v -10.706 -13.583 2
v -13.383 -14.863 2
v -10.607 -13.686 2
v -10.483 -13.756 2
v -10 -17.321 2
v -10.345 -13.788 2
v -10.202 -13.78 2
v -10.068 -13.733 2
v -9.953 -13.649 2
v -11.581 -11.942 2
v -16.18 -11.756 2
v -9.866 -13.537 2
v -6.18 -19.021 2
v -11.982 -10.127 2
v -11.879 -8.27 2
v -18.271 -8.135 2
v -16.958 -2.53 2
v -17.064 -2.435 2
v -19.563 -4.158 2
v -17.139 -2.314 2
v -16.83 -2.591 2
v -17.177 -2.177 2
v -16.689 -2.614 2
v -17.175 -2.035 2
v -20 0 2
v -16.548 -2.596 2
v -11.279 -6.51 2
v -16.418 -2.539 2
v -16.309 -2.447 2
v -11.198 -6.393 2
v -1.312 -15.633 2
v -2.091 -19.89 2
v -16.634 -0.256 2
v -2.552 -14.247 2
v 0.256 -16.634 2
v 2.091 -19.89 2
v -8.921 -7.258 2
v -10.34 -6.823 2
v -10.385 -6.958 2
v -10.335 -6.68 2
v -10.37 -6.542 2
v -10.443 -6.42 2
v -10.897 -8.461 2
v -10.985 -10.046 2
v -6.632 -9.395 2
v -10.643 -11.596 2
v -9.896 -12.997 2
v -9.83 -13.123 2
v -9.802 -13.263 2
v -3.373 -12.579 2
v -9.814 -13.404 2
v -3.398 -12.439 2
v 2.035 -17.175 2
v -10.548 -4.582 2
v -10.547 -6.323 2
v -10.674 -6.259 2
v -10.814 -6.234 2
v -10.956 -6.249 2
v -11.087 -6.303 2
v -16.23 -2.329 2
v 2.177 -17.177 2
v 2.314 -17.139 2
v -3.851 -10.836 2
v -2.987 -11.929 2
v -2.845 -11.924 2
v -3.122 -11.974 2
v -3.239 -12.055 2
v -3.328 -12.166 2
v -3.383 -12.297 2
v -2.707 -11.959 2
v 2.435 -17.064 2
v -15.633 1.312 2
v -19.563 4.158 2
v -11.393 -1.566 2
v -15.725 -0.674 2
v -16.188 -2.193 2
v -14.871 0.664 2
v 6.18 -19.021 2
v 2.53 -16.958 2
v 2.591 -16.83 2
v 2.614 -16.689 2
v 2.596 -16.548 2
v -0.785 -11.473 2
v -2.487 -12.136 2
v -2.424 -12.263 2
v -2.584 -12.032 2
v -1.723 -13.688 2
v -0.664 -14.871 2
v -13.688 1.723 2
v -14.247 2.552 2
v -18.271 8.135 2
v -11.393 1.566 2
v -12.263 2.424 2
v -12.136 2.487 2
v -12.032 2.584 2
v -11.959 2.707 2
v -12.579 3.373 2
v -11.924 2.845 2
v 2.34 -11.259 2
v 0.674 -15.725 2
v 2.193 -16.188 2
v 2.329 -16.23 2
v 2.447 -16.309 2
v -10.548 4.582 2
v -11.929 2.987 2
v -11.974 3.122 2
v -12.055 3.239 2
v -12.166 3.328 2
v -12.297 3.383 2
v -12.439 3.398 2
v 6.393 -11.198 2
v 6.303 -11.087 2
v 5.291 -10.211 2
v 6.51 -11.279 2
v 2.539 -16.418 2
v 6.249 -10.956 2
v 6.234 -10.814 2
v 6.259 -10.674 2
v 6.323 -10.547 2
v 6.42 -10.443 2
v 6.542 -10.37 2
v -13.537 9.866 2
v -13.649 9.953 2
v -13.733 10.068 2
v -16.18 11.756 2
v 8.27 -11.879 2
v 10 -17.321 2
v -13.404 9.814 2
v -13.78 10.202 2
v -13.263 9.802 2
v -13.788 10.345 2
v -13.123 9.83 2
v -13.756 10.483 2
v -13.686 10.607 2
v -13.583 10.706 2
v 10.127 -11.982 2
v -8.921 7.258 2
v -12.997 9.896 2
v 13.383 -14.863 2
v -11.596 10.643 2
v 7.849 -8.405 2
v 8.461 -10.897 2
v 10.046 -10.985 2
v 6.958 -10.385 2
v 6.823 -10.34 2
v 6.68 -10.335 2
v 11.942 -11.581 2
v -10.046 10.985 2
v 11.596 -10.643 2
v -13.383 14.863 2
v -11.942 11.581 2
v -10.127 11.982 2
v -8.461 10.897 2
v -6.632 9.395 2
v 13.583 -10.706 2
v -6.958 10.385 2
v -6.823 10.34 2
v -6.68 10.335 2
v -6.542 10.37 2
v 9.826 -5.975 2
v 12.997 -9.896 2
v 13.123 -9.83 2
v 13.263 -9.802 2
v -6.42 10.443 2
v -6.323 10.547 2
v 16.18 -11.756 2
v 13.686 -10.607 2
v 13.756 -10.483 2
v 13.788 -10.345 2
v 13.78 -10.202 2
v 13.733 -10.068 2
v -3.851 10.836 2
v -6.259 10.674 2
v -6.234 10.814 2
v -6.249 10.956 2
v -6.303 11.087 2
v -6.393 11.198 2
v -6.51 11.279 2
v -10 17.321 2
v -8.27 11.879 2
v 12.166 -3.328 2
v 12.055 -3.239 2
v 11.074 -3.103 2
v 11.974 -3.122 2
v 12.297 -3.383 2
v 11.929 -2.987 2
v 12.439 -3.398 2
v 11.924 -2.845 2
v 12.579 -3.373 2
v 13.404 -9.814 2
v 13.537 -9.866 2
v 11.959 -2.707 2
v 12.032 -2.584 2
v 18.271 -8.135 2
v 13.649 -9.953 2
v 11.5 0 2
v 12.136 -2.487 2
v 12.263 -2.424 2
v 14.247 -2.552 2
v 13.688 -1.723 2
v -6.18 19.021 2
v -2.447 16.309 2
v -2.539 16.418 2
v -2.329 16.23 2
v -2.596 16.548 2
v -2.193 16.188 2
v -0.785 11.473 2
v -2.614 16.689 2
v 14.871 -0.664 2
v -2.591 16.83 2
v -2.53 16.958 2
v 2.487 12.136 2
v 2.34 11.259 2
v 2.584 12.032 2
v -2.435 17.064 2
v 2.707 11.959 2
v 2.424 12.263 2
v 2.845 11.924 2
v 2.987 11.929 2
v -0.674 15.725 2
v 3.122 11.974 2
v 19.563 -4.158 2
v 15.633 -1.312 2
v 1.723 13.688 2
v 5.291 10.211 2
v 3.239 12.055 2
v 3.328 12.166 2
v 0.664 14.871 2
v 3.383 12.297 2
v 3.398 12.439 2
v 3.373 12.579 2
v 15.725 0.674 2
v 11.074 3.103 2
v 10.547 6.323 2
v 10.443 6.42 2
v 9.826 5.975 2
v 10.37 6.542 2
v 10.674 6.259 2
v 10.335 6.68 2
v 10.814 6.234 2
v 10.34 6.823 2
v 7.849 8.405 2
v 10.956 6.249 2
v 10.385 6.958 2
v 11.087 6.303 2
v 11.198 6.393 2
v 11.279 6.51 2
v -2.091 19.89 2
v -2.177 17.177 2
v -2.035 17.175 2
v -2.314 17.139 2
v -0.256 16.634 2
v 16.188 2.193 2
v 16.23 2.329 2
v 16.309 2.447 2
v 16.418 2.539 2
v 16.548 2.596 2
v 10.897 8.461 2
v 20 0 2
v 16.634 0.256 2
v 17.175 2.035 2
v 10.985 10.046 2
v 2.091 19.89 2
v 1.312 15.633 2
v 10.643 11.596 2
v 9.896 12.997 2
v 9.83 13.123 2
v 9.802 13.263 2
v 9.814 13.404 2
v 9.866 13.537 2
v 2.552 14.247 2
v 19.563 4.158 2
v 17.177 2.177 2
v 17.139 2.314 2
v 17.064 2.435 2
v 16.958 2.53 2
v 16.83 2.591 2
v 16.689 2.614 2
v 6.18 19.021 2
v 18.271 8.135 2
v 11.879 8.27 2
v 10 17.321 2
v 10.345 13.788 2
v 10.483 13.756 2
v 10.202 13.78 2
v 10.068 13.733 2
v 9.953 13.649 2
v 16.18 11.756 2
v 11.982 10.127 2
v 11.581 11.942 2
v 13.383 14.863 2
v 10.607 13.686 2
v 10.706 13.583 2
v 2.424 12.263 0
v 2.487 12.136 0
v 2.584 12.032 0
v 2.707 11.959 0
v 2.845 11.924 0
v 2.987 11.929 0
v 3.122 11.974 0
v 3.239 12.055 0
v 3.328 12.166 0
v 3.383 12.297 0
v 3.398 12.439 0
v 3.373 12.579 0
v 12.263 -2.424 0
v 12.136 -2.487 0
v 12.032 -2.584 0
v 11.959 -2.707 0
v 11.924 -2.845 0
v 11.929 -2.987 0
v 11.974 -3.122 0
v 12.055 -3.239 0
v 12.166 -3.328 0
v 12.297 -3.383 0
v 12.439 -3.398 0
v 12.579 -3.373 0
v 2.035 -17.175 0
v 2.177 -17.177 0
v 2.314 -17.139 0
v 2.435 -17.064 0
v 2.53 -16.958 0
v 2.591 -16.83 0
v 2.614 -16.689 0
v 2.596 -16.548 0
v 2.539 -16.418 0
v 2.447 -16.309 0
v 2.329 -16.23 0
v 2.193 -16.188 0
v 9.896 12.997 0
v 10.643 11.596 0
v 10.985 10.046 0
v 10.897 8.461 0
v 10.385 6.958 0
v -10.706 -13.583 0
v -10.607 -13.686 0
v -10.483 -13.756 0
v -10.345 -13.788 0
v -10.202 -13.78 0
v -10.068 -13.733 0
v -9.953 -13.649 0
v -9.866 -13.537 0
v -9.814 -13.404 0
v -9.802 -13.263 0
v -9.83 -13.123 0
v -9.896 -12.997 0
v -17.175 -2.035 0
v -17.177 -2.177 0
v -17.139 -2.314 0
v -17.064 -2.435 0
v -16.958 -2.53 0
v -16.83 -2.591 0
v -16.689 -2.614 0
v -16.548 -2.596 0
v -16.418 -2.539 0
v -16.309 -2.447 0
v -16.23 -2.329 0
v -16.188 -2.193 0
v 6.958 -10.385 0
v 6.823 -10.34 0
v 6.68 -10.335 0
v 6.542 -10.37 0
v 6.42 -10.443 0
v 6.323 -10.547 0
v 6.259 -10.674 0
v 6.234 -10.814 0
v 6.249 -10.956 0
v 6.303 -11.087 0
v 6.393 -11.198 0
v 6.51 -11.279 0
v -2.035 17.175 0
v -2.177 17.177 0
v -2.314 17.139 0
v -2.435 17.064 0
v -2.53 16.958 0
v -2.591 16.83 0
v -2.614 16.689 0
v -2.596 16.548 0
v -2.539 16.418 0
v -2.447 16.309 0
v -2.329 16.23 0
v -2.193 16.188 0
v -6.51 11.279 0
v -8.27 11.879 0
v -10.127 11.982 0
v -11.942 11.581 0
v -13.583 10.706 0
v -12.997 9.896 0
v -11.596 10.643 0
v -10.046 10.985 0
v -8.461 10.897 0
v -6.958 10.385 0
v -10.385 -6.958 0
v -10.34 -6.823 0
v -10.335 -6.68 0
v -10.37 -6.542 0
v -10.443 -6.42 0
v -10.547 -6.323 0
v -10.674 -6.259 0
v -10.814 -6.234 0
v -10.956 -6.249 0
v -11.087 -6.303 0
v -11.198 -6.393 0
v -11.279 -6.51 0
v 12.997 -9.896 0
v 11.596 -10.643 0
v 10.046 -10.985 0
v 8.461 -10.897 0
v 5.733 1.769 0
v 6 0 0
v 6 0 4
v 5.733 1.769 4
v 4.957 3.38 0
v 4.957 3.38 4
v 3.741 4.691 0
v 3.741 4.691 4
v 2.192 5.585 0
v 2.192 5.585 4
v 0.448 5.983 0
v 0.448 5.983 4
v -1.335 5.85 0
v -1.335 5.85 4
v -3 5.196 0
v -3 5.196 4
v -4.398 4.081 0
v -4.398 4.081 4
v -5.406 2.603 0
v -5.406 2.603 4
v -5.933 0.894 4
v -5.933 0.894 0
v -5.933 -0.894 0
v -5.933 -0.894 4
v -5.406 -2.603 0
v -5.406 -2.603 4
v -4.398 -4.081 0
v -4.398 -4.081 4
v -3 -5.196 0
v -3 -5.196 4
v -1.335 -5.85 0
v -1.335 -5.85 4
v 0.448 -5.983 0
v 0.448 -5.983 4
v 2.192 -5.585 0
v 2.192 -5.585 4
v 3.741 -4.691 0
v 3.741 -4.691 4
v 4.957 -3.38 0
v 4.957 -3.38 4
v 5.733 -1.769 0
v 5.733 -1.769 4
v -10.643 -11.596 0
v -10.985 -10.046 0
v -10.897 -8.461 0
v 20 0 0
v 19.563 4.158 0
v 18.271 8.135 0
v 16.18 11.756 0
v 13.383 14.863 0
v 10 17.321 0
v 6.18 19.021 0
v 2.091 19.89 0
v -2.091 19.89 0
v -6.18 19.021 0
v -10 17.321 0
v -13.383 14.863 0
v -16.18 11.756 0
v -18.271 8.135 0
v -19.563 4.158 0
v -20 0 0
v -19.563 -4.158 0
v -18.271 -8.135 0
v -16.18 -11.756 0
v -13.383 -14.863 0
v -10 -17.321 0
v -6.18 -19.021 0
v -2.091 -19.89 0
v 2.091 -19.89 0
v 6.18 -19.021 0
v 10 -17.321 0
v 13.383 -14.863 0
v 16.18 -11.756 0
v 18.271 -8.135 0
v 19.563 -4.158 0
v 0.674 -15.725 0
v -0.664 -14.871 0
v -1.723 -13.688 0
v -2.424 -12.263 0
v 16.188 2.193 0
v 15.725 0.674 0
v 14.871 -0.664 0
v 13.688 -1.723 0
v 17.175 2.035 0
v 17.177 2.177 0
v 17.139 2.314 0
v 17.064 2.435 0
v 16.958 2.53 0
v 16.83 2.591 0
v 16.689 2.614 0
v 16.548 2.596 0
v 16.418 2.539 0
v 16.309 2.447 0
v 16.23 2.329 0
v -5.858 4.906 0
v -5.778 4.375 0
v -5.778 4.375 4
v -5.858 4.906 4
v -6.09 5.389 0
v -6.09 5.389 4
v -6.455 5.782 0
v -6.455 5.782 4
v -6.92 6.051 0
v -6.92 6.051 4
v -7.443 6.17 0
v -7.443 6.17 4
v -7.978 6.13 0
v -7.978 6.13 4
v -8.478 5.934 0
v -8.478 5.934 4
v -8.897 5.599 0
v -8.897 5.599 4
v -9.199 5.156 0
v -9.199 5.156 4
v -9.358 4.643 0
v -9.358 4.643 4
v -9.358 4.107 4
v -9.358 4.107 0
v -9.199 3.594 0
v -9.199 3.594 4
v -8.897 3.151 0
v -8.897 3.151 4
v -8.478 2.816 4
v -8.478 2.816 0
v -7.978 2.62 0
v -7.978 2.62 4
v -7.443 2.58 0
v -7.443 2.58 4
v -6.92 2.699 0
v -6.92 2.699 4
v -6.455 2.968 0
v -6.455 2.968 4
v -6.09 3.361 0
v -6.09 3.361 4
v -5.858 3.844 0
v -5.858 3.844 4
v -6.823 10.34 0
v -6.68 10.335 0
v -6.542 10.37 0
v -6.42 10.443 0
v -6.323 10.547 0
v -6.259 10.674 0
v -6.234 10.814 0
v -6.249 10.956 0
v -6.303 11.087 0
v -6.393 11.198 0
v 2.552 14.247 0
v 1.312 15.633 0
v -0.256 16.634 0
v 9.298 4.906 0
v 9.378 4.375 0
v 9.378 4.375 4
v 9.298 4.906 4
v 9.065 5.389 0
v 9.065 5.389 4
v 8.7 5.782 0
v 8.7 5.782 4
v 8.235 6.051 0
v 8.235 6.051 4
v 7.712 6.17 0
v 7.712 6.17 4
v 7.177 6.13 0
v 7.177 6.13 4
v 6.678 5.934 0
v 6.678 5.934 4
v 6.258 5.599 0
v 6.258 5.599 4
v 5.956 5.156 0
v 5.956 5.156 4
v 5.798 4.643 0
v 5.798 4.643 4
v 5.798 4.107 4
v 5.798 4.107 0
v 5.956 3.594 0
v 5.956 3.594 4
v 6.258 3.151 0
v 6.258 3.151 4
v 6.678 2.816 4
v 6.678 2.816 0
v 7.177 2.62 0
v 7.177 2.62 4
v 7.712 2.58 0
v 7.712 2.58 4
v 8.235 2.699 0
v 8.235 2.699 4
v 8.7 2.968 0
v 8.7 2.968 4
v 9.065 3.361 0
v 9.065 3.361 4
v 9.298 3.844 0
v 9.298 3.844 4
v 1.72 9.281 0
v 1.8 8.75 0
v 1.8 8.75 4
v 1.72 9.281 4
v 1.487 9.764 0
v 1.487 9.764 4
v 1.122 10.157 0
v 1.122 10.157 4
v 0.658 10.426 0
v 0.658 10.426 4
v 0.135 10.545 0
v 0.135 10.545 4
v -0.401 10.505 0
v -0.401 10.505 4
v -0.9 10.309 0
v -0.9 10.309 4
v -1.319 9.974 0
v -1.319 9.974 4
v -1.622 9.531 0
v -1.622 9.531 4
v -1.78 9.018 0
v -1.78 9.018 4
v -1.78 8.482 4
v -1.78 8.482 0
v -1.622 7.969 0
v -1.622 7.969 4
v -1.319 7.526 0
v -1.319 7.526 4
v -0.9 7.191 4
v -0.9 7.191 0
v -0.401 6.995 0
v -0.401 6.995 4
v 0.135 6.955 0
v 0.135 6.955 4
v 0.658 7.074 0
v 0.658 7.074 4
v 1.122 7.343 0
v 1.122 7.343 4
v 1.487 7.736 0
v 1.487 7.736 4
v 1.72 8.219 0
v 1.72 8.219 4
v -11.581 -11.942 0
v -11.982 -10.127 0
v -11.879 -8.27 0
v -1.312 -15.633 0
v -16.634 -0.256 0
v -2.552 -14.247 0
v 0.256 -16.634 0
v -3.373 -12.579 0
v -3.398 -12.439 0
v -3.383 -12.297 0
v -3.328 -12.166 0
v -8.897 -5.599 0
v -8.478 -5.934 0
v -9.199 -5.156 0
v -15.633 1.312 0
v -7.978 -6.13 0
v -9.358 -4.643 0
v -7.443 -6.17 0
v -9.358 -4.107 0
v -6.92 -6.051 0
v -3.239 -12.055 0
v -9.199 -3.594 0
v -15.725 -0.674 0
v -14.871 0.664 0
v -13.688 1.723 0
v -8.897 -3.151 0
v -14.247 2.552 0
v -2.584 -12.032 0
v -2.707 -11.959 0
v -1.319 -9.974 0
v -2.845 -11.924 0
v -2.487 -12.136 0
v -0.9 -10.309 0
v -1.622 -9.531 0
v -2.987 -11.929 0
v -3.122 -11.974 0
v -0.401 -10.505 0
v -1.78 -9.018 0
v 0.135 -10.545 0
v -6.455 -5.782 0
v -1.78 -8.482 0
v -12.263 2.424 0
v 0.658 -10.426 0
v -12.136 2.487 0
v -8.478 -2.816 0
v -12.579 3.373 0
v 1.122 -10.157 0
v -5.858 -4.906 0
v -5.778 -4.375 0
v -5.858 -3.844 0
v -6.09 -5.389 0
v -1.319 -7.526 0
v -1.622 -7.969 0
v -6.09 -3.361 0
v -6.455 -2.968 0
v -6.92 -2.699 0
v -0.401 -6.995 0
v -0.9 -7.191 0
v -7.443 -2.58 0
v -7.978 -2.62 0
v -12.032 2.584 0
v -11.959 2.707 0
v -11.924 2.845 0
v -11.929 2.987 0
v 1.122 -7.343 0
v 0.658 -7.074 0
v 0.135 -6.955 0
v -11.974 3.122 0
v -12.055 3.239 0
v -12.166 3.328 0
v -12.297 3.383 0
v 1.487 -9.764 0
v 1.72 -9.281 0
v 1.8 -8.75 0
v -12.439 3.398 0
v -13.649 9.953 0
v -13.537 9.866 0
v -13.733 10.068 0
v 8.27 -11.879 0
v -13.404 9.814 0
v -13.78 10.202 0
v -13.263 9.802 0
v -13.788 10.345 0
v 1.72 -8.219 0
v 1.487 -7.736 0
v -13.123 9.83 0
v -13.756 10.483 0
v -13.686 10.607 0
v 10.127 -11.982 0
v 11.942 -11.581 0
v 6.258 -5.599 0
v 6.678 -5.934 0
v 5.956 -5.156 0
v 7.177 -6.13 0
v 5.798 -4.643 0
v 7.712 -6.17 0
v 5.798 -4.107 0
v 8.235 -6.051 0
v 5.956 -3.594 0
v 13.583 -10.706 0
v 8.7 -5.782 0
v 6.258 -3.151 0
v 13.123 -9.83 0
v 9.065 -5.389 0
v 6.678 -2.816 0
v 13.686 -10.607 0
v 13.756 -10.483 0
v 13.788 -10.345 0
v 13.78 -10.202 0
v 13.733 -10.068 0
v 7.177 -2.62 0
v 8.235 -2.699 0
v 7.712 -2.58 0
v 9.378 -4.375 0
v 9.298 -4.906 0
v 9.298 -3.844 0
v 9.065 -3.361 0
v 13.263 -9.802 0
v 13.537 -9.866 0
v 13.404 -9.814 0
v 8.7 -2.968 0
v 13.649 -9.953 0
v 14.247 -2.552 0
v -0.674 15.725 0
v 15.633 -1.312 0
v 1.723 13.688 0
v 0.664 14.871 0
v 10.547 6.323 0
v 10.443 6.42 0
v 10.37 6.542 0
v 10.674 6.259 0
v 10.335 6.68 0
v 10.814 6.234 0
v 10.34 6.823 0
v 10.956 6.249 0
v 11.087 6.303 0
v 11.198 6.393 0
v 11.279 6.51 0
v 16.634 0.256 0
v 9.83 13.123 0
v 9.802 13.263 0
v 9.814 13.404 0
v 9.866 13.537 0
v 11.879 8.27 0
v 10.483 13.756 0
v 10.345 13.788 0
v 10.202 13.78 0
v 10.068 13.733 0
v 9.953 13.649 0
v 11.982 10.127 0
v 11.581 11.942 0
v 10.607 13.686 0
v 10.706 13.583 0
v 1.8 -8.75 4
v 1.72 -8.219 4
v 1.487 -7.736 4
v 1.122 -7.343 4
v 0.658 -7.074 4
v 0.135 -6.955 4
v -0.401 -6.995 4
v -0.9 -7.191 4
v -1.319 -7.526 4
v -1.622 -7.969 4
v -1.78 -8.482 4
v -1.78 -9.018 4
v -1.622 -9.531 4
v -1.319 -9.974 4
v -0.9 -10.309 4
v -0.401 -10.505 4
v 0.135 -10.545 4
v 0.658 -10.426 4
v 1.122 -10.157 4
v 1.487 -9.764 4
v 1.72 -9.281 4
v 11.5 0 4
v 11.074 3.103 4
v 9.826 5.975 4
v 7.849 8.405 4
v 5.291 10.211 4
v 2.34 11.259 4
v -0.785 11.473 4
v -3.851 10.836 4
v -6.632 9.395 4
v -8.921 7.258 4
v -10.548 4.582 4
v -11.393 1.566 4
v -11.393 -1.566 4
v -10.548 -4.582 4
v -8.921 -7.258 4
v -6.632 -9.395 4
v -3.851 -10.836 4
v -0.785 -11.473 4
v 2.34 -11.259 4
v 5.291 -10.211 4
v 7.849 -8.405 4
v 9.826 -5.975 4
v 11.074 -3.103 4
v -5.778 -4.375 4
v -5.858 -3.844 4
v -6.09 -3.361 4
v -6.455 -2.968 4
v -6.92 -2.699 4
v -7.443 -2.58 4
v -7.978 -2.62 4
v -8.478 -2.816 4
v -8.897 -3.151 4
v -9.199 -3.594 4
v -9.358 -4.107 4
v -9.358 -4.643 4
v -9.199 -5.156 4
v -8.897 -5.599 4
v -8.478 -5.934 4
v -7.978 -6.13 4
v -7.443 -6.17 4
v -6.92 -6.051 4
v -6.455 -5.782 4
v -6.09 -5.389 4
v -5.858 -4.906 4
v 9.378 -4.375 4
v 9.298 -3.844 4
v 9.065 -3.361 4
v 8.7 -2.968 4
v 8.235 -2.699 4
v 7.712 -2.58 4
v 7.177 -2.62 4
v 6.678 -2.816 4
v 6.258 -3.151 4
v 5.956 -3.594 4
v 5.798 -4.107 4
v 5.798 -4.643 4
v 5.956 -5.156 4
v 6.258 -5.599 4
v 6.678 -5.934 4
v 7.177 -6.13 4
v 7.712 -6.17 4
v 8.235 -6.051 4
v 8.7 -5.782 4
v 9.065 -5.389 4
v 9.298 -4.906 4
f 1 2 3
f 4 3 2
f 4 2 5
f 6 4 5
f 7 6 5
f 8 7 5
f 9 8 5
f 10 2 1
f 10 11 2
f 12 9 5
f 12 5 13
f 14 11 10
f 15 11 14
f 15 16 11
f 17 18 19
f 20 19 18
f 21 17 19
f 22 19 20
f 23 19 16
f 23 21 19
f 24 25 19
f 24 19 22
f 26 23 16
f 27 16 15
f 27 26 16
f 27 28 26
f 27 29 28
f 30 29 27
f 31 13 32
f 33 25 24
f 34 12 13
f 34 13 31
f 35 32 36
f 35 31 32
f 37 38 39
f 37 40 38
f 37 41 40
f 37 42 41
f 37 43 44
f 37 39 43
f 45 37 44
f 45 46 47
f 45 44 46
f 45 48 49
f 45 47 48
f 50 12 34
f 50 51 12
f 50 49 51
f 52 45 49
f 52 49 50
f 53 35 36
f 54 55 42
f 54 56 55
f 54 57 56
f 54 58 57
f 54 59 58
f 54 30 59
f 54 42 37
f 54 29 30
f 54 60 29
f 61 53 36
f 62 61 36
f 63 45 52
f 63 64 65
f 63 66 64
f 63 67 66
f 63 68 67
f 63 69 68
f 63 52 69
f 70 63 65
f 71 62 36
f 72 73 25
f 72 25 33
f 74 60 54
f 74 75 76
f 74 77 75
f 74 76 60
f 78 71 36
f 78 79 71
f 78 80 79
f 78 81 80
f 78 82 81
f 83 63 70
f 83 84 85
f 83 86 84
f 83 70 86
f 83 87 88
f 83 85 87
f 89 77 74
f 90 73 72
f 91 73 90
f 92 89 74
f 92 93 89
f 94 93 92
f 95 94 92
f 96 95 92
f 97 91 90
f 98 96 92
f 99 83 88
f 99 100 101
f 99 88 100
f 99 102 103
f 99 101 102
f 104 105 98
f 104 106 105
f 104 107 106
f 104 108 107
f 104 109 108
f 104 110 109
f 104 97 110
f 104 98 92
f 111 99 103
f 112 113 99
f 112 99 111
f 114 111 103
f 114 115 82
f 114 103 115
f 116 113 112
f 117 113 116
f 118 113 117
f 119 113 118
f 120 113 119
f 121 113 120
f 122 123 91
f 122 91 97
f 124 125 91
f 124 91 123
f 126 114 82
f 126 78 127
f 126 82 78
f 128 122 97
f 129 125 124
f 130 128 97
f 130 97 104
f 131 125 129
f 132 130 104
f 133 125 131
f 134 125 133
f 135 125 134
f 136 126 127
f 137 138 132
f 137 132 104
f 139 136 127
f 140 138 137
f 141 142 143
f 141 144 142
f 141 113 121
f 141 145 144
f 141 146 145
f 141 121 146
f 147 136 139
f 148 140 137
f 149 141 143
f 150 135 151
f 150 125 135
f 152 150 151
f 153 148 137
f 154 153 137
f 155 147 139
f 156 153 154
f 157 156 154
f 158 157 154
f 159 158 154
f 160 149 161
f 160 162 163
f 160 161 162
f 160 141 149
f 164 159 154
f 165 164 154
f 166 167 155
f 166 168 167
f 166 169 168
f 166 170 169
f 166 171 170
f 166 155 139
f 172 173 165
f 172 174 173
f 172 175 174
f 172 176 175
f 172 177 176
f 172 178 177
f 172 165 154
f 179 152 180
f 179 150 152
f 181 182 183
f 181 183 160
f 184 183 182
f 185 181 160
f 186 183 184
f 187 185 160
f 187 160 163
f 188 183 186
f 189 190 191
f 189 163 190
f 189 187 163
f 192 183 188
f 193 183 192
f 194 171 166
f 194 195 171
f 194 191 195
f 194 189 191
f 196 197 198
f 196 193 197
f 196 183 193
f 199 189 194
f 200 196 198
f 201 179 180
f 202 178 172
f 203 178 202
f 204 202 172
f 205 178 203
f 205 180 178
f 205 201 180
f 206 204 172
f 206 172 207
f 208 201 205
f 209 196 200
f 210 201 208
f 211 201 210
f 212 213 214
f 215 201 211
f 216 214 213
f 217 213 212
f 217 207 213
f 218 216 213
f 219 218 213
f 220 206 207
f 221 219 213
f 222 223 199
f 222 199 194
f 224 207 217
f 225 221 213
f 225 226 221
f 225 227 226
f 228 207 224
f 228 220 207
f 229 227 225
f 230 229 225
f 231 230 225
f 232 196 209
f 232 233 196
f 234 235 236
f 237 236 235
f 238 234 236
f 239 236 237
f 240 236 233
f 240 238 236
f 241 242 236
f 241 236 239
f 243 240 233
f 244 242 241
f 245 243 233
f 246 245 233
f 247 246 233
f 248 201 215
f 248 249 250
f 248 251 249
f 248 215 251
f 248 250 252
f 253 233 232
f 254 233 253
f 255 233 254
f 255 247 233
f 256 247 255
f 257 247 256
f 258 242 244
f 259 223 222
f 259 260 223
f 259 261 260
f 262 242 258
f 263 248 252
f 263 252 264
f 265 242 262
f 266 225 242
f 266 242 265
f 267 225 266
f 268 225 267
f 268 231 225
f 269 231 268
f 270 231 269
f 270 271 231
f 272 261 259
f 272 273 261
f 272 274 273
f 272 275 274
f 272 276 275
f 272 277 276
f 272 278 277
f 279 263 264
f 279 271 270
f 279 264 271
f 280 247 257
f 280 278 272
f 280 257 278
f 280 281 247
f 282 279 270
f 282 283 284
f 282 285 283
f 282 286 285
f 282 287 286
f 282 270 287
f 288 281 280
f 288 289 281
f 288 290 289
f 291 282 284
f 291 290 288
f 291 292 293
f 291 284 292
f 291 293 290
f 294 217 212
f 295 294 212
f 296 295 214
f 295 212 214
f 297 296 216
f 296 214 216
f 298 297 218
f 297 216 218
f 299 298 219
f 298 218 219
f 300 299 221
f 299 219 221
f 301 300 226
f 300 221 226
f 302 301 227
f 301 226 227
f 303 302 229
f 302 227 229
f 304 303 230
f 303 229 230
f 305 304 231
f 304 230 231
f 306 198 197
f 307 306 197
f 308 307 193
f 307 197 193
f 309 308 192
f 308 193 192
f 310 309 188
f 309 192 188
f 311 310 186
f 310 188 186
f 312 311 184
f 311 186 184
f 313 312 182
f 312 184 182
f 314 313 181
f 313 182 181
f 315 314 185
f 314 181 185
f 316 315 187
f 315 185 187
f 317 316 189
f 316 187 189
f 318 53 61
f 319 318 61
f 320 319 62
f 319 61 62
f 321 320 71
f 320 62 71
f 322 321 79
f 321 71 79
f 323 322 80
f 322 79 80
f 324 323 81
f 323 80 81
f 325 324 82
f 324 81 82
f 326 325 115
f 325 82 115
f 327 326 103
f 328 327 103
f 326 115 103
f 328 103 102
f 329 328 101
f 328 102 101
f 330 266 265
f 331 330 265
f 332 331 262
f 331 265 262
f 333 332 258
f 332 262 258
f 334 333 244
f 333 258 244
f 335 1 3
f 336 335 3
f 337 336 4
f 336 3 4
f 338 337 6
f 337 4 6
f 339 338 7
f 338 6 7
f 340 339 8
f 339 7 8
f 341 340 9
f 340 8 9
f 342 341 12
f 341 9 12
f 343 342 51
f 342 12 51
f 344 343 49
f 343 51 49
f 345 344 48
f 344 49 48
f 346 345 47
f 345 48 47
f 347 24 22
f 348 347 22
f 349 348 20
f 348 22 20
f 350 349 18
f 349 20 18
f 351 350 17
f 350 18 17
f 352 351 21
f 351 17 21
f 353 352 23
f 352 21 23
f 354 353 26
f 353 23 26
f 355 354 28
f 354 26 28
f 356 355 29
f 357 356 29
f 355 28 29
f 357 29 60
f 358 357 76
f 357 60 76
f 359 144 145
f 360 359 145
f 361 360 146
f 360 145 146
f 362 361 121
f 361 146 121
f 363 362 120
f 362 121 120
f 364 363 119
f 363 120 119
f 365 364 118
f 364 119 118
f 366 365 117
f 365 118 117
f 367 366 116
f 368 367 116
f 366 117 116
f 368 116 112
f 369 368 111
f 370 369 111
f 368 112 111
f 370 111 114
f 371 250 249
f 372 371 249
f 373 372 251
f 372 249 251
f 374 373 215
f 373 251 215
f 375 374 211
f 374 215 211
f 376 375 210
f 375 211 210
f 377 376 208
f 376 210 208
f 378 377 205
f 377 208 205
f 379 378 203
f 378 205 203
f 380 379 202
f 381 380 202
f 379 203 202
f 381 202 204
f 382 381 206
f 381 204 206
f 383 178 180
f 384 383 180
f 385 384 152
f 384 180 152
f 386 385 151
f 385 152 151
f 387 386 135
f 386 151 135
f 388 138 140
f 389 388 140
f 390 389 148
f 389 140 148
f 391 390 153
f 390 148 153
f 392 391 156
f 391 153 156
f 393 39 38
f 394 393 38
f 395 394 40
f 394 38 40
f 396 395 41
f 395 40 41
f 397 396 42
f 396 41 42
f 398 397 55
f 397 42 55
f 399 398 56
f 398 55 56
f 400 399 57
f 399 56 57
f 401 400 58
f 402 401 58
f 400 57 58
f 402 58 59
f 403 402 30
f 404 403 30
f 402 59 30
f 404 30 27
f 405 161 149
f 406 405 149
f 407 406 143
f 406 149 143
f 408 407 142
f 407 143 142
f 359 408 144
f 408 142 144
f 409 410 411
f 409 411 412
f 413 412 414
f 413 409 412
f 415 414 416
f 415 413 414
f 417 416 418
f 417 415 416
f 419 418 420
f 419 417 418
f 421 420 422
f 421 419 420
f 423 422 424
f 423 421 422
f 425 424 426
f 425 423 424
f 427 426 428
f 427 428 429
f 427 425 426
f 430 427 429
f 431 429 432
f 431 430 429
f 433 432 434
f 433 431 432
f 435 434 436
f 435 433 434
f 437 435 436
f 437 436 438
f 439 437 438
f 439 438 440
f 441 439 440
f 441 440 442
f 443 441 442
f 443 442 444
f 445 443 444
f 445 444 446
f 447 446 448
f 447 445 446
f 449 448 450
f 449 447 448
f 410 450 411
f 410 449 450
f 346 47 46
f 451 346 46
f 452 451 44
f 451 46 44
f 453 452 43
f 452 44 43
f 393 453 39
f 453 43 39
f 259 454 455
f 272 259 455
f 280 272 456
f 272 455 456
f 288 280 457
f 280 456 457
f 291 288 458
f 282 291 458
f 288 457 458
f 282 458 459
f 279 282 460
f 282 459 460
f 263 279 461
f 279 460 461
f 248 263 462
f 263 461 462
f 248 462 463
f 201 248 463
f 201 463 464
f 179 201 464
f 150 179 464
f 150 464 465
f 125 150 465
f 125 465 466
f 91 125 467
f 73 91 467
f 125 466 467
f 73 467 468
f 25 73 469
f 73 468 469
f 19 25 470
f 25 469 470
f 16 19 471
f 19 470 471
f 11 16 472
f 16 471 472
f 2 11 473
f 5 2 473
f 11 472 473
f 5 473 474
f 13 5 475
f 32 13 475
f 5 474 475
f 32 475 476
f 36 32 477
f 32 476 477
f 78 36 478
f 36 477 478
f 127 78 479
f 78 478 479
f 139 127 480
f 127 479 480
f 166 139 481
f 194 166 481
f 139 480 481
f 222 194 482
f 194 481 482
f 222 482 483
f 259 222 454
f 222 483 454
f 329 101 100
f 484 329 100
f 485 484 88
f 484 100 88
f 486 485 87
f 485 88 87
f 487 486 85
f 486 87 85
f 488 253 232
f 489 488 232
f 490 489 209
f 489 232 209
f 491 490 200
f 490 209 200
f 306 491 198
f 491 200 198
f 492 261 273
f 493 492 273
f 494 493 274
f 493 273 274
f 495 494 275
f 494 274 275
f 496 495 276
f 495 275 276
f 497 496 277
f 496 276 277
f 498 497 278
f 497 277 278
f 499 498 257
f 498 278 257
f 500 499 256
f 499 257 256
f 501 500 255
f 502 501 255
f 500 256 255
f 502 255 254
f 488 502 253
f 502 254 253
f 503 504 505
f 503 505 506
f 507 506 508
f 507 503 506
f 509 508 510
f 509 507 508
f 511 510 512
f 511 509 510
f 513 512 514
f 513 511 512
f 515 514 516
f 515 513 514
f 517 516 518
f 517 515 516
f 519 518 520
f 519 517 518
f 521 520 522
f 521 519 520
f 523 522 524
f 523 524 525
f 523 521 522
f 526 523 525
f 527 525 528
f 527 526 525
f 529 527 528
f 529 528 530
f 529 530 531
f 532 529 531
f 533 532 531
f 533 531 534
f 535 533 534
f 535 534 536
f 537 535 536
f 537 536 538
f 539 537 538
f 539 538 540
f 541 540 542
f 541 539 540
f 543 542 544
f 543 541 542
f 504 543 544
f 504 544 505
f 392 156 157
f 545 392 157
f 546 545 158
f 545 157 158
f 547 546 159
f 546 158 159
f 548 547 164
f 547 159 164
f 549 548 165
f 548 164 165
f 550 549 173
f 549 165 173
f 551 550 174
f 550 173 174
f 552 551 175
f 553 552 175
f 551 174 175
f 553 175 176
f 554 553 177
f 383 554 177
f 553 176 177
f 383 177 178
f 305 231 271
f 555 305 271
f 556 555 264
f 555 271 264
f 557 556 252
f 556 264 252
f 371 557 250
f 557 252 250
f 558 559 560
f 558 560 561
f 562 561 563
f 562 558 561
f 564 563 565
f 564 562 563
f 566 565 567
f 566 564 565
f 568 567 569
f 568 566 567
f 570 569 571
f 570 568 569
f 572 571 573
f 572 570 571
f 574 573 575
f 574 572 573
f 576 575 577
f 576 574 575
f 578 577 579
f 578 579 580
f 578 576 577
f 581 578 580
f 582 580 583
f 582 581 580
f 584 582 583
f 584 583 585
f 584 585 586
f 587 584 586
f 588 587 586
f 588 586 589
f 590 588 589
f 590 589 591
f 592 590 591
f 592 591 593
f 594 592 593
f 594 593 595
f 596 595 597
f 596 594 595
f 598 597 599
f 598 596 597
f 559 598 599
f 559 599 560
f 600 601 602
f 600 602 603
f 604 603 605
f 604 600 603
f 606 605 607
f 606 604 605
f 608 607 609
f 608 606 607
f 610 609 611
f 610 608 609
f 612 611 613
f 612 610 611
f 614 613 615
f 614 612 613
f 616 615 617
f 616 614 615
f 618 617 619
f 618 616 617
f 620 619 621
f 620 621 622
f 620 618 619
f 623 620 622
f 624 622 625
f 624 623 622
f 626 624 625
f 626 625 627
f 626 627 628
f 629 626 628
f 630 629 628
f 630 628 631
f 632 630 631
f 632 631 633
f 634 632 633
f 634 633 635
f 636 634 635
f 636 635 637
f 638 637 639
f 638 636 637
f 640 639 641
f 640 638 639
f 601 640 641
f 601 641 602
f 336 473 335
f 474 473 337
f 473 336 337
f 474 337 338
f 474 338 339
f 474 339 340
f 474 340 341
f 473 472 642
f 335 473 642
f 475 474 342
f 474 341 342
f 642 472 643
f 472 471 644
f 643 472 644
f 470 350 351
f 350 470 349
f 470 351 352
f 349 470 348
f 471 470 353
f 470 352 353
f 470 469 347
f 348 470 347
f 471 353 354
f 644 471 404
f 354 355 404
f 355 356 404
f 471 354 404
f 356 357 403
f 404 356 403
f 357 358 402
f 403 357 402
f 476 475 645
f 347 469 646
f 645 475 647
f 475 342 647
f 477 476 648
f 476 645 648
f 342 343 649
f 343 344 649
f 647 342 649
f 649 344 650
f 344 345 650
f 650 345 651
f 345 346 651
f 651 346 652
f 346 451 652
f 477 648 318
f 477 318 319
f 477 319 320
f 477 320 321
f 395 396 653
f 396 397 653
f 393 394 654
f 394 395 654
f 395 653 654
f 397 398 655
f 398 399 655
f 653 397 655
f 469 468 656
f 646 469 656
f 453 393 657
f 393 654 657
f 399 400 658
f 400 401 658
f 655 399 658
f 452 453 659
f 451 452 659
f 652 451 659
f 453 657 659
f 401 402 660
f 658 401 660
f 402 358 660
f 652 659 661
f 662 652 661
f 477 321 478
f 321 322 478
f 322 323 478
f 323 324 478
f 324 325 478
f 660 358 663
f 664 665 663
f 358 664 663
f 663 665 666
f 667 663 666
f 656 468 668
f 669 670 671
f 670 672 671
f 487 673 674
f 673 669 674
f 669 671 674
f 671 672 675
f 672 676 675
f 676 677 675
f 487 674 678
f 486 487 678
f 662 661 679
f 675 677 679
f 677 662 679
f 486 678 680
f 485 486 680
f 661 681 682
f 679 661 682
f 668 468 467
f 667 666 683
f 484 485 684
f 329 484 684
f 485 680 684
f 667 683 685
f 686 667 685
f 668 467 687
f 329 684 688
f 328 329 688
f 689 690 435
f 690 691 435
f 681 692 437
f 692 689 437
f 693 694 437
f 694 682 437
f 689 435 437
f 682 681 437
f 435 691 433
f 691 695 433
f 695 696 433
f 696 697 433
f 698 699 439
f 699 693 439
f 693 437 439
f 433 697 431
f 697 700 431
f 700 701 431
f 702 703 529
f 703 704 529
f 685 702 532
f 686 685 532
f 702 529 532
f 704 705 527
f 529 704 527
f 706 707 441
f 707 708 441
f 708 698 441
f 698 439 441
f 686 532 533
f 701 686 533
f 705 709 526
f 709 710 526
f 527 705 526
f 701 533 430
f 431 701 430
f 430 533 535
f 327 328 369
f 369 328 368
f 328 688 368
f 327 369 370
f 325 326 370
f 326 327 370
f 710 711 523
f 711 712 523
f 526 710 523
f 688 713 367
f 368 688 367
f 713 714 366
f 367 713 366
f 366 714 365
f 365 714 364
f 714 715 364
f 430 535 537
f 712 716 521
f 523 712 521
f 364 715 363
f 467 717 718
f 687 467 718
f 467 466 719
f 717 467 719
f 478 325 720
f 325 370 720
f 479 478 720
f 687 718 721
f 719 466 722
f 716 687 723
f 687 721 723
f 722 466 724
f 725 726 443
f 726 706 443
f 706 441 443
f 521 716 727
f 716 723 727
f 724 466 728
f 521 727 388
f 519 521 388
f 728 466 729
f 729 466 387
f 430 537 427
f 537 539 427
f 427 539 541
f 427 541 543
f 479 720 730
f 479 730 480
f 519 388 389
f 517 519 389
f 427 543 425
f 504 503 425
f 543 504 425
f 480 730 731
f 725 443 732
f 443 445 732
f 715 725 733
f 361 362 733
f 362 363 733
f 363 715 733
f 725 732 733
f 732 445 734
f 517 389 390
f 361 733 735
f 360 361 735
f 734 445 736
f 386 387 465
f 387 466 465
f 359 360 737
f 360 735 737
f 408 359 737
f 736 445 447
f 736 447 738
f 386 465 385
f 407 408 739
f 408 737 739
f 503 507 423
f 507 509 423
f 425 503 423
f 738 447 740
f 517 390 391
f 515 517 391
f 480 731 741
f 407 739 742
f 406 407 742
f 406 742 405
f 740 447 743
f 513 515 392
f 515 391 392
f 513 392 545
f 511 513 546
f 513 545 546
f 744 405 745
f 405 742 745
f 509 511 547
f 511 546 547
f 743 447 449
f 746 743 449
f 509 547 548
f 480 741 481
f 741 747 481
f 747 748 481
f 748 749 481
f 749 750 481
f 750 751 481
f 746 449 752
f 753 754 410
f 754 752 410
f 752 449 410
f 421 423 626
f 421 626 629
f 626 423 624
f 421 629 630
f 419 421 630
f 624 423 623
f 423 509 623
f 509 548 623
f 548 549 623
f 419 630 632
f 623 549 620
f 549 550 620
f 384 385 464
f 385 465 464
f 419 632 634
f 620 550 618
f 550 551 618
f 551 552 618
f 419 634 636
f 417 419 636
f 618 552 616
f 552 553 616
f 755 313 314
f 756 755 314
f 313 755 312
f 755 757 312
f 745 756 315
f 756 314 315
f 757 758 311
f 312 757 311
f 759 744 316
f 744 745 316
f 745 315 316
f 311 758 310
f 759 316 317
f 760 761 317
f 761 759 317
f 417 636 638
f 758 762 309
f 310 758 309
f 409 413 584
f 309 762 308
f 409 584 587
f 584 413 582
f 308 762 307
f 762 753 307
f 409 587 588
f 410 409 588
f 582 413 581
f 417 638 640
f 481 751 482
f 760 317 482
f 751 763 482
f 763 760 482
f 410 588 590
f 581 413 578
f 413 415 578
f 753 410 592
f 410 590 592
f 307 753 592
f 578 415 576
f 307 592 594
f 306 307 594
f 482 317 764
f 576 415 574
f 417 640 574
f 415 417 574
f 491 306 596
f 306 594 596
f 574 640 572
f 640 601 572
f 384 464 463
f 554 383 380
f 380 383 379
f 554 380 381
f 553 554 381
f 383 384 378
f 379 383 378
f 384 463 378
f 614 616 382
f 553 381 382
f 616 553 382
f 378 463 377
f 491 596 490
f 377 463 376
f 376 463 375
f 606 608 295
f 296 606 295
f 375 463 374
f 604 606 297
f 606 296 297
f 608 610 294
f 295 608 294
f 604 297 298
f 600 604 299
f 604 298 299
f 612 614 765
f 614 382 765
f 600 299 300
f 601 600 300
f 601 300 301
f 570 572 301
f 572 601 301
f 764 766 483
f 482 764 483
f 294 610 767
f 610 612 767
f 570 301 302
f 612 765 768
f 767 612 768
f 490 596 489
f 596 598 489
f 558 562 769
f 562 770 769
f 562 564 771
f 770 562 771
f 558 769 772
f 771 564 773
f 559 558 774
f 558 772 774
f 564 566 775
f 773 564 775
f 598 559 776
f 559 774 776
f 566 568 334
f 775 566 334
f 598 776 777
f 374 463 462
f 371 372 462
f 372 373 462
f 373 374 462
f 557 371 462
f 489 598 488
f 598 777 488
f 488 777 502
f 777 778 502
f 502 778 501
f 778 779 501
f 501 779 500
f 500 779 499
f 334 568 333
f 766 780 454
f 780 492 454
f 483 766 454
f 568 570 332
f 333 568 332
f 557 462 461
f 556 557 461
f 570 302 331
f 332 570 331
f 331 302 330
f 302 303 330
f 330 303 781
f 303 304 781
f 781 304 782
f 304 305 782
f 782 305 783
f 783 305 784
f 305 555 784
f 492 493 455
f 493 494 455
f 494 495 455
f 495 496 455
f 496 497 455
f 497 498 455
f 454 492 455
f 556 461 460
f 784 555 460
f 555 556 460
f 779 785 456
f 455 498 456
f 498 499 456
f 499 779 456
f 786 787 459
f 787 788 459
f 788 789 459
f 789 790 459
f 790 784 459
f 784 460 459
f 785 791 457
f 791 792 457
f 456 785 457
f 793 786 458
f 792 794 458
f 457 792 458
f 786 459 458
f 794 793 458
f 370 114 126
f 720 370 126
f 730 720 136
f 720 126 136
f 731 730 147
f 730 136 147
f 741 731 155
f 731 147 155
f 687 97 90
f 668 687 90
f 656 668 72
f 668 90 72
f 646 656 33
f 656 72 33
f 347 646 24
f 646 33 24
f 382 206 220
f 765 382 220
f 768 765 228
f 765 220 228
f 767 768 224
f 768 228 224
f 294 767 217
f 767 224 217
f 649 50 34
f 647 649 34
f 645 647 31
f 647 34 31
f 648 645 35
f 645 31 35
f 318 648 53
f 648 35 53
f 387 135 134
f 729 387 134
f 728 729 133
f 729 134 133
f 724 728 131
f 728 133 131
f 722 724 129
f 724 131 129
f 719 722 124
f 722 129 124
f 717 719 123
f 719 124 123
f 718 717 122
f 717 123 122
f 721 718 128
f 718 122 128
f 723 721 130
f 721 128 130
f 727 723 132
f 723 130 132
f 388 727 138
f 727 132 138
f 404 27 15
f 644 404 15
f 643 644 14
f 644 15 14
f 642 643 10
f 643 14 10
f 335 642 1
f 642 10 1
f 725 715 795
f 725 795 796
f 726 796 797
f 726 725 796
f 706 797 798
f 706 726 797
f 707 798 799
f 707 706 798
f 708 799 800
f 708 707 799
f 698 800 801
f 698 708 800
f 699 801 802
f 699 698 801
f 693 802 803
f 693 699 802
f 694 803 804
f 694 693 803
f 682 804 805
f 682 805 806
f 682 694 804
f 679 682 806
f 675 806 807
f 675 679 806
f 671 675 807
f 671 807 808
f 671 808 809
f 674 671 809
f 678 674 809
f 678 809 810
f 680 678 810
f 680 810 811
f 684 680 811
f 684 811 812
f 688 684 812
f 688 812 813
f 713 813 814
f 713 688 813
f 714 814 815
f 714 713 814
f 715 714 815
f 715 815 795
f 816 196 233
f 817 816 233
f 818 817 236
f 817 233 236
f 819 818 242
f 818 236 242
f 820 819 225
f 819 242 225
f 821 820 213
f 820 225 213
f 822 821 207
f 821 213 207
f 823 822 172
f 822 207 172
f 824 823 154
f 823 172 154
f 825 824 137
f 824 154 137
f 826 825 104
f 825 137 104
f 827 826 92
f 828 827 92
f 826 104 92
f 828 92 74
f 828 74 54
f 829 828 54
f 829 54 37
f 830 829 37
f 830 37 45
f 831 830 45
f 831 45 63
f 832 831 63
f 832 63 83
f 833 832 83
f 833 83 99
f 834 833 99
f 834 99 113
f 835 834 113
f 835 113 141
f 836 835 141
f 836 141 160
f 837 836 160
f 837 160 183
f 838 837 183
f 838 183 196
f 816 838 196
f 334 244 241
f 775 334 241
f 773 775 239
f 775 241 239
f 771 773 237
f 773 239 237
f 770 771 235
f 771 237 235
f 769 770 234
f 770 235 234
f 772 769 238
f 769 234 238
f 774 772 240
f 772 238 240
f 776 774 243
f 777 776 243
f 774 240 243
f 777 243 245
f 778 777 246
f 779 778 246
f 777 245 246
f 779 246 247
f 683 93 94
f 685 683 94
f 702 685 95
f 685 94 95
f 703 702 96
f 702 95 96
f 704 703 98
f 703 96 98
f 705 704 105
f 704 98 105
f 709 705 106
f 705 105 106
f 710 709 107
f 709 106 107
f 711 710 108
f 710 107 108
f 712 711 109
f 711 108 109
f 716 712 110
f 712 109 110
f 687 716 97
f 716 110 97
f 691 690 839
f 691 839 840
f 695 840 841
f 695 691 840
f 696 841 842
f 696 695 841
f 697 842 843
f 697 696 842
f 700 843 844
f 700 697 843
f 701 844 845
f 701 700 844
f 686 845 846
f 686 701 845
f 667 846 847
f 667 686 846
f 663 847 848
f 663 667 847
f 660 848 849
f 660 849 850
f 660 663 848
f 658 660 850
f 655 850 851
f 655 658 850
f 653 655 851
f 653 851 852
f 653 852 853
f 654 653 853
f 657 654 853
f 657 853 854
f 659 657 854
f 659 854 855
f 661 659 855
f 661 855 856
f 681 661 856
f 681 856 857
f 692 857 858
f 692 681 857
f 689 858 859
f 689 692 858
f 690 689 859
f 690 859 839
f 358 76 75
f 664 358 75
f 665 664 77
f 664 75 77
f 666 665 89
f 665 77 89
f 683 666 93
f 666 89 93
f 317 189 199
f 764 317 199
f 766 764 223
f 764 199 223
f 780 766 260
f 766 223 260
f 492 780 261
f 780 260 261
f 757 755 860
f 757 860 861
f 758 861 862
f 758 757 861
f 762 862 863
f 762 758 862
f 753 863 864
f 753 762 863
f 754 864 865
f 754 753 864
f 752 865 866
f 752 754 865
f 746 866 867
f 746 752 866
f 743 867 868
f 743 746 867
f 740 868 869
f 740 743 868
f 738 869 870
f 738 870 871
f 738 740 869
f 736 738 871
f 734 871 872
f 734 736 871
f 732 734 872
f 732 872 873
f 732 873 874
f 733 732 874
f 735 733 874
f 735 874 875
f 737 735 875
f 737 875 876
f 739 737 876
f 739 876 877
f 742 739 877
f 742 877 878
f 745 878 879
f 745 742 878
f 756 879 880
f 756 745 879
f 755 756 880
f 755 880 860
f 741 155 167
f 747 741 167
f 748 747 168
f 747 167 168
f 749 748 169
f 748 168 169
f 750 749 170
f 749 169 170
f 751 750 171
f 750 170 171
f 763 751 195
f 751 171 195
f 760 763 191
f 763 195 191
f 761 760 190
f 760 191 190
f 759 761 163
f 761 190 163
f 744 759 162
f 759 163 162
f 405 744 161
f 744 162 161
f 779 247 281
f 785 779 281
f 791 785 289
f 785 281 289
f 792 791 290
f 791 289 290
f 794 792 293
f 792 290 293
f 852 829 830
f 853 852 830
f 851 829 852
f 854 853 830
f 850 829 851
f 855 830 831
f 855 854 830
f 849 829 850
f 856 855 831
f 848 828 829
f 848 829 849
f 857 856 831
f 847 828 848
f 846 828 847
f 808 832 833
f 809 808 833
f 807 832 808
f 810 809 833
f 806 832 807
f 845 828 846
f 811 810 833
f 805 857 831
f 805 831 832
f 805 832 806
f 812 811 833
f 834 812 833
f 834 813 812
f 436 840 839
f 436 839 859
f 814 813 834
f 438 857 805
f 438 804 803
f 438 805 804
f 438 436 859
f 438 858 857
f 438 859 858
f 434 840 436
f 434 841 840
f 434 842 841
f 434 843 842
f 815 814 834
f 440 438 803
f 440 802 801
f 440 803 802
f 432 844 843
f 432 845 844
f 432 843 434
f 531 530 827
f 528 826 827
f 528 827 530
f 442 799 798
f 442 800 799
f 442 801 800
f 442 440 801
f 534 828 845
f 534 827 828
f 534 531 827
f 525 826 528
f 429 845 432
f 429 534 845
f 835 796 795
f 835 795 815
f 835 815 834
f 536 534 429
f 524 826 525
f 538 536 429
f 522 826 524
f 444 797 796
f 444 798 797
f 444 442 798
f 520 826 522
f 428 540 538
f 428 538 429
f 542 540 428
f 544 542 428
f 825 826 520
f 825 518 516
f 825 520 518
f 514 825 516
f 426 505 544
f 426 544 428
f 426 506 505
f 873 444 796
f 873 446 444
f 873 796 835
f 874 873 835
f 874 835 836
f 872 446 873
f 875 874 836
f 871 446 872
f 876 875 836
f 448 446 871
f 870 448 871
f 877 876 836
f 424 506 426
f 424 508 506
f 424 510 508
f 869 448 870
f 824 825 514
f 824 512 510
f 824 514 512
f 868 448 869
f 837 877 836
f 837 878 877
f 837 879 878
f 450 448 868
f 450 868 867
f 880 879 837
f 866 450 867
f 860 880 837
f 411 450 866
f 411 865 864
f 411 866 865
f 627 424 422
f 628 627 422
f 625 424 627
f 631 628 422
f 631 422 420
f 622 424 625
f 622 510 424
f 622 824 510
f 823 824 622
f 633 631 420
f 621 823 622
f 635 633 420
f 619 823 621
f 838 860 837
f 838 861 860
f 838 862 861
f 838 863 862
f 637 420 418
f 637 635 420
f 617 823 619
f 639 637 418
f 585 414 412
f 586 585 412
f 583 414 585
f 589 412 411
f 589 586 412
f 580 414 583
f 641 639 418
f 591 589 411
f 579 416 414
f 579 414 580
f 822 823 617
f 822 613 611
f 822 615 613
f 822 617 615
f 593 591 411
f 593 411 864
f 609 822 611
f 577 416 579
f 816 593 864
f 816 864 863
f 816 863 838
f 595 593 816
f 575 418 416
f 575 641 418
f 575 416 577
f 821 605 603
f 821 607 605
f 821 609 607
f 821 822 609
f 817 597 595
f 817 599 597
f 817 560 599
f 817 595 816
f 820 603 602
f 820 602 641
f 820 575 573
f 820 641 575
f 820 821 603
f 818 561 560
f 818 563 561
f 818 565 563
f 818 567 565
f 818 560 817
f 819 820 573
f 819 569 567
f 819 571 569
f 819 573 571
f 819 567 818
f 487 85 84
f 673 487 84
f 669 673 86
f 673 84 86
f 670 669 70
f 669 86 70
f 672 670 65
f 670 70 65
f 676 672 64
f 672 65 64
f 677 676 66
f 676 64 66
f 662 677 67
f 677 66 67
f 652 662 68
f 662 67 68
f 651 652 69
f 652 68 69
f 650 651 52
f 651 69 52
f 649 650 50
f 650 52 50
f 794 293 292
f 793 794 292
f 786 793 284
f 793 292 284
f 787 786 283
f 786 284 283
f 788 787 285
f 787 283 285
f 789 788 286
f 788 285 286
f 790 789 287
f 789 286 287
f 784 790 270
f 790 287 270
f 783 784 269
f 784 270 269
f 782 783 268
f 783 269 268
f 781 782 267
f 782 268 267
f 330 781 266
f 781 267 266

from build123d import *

# Parameters (mm, degrees)
F0_R     = 11.5
F0_R_2   = 1.8
F0_R_3   = 6
F1_DEPTH = 4
F0_R_4   = 20
F2_DEPTH = 2
F4_DEPTH = 2.001


with BuildPart() as f1:
    # F0 (on Top) → F1 (new body)
    with BuildSketch(Plane.XY):
        Circle(F0_R)
        with Locations((-7.577722, -4.375)):
            Circle(F0_R_2, mode=Mode.SUBTRACT)
        with Locations((0, -8.75)):
            Circle(F0_R_2, mode=Mode.SUBTRACT)
        with Locations((7.577722, -4.375)):
            Circle(F0_R_2, mode=Mode.SUBTRACT)
        with Locations((-7.577722, 4.375)):
            Circle(F0_R_2, mode=Mode.SUBTRACT)
        Circle(F0_R_3, mode=Mode.SUBTRACT)
        with Locations((7.577722, 4.375)):
            Circle(F0_R_2, mode=Mode.SUBTRACT)
        with Locations((0, 8.75)):
            Circle(F0_R_2, mode=Mode.SUBTRACT)
    extrude(amount=F1_DEPTH)

    # F0 (on Top) → F2 (join)
    with BuildSketch(Plane.XY):
        Circle(F0_R_4)
        Circle(F0_R, mode=Mode.SUBTRACT)
    extrude(amount=F2_DEPTH)

    # F3 (on face) → F4 (cut, through all)
    with BuildSketch(Plane.XY.offset(2)):
        with BuildLine():
            ThreePointArc((-2.192977, 16.187632), (0.664228, 14.871151), (2.423816, 12.263358))
            ThreePointArc((2.423816, 12.263358), (3.055985, 11.946556), (3.372786, 12.578724))
            ThreePointArc((3.372786, 12.578724), (1.311876, 15.633091), (-2.034612, 17.175013))
            ThreePointArc((-2.034612, 17.175013), (-2.607485, 16.760505), (-2.192977, 16.187632))
        make_face()
        with BuildLine():
            ThreePointArc((6.957606, -10.3854), (6.286583, -10.608398), (6.509581, -11.279421))
            ThreePointArc((6.509581, -11.279421), (10.126628, -11.981901), (13.583256, -10.705881))
            ThreePointArc((13.583256, -10.705881), (13.695237, -10.007697), (12.997054, -9.895716))
            ThreePointArc((12.997054, -9.895716), (10.045812, -10.985172), (6.957606, -10.3854))
        make_face()
        with BuildLine():
            ThreePointArc((-2.423816, -12.263358), (-3.055985, -11.946556), (-3.372786, -12.578724))
            ThreePointArc((-3.372786, -12.578724), (-1.311876, -15.633091), (2.034612, -17.175013))
            ThreePointArc((2.034612, -17.175013), (2.607485, -16.760505), (2.192977, -16.187632))
            ThreePointArc((2.192977, -16.187632), (-0.664228, -14.871151), (-2.423816, -12.263358))
        make_face()
        with BuildLine():
            ThreePointArc((-10.3854, -6.957606), (-10.608398, -6.286583), (-11.279421, -6.509581))
            ThreePointArc((-11.279421, -6.509581), (-11.981901, -10.126628), (-10.705881, -13.583256))
            ThreePointArc((-10.705881, -13.583256), (-10.007697, -13.695237), (-9.895716, -12.997054))
            ThreePointArc((-9.895716, -12.997054), (-10.985172, -10.045812), (-10.3854, -6.957606))
        make_face()
        with BuildLine():
            ThreePointArc((-12.263358, 2.423816), (-11.946556, 3.055985), (-12.578724, 3.372786))
            ThreePointArc((-12.578724, 3.372786), (-15.633091, 1.311876), (-17.175013, -2.034612))
            ThreePointArc((-17.175013, -2.034612), (-16.760505, -2.607485), (-16.187632, -2.192977))
            ThreePointArc((-16.187632, -2.192977), (-14.871151, 0.664228), (-12.263358, 2.423816))
        make_face()
        with BuildLine():
            ThreePointArc((-6.957606, 10.3854), (-6.286583, 10.608398), (-6.509581, 11.279421))
            ThreePointArc((-6.509581, 11.279421), (-10.126628, 11.981901), (-13.583256, 10.705881))
            ThreePointArc((-13.583256, 10.705881), (-13.695237, 10.007697), (-12.997054, 9.895716))
            ThreePointArc((-12.997054, 9.895716), (-10.045812, 10.985172), (-6.957606, 10.3854))
        make_face()
        with BuildLine():
            ThreePointArc((10.3854, 6.957606), (10.608398, 6.286583), (11.279421, 6.509581))
            ThreePointArc((11.279421, 6.509581), (11.981901, 10.126628), (10.705881, 13.583256))
            ThreePointArc((10.705881, 13.583256), (10.007697, 13.695237), (9.895716, 12.997054))
            ThreePointArc((9.895716, 12.997054), (10.985172, 10.045812), (10.3854, 6.957606))
        make_face()
        with BuildLine():
            ThreePointArc((12.263358, -2.423816), (11.946556, -3.055985), (12.578724, -3.372786))
            ThreePointArc((12.578724, -3.372786), (15.633091, -1.311876), (17.175013, 2.034612))
            ThreePointArc((17.175013, 2.034612), (16.760505, 2.607485), (16.187632, 2.192977))
            ThreePointArc((16.187632, 2.192977), (14.871151, -0.664228), (12.263358, -2.423816))
        make_face()
    extrude(amount=-F4_DEPTH, mode=Mode.SUBTRACT)


solid = f1.part
